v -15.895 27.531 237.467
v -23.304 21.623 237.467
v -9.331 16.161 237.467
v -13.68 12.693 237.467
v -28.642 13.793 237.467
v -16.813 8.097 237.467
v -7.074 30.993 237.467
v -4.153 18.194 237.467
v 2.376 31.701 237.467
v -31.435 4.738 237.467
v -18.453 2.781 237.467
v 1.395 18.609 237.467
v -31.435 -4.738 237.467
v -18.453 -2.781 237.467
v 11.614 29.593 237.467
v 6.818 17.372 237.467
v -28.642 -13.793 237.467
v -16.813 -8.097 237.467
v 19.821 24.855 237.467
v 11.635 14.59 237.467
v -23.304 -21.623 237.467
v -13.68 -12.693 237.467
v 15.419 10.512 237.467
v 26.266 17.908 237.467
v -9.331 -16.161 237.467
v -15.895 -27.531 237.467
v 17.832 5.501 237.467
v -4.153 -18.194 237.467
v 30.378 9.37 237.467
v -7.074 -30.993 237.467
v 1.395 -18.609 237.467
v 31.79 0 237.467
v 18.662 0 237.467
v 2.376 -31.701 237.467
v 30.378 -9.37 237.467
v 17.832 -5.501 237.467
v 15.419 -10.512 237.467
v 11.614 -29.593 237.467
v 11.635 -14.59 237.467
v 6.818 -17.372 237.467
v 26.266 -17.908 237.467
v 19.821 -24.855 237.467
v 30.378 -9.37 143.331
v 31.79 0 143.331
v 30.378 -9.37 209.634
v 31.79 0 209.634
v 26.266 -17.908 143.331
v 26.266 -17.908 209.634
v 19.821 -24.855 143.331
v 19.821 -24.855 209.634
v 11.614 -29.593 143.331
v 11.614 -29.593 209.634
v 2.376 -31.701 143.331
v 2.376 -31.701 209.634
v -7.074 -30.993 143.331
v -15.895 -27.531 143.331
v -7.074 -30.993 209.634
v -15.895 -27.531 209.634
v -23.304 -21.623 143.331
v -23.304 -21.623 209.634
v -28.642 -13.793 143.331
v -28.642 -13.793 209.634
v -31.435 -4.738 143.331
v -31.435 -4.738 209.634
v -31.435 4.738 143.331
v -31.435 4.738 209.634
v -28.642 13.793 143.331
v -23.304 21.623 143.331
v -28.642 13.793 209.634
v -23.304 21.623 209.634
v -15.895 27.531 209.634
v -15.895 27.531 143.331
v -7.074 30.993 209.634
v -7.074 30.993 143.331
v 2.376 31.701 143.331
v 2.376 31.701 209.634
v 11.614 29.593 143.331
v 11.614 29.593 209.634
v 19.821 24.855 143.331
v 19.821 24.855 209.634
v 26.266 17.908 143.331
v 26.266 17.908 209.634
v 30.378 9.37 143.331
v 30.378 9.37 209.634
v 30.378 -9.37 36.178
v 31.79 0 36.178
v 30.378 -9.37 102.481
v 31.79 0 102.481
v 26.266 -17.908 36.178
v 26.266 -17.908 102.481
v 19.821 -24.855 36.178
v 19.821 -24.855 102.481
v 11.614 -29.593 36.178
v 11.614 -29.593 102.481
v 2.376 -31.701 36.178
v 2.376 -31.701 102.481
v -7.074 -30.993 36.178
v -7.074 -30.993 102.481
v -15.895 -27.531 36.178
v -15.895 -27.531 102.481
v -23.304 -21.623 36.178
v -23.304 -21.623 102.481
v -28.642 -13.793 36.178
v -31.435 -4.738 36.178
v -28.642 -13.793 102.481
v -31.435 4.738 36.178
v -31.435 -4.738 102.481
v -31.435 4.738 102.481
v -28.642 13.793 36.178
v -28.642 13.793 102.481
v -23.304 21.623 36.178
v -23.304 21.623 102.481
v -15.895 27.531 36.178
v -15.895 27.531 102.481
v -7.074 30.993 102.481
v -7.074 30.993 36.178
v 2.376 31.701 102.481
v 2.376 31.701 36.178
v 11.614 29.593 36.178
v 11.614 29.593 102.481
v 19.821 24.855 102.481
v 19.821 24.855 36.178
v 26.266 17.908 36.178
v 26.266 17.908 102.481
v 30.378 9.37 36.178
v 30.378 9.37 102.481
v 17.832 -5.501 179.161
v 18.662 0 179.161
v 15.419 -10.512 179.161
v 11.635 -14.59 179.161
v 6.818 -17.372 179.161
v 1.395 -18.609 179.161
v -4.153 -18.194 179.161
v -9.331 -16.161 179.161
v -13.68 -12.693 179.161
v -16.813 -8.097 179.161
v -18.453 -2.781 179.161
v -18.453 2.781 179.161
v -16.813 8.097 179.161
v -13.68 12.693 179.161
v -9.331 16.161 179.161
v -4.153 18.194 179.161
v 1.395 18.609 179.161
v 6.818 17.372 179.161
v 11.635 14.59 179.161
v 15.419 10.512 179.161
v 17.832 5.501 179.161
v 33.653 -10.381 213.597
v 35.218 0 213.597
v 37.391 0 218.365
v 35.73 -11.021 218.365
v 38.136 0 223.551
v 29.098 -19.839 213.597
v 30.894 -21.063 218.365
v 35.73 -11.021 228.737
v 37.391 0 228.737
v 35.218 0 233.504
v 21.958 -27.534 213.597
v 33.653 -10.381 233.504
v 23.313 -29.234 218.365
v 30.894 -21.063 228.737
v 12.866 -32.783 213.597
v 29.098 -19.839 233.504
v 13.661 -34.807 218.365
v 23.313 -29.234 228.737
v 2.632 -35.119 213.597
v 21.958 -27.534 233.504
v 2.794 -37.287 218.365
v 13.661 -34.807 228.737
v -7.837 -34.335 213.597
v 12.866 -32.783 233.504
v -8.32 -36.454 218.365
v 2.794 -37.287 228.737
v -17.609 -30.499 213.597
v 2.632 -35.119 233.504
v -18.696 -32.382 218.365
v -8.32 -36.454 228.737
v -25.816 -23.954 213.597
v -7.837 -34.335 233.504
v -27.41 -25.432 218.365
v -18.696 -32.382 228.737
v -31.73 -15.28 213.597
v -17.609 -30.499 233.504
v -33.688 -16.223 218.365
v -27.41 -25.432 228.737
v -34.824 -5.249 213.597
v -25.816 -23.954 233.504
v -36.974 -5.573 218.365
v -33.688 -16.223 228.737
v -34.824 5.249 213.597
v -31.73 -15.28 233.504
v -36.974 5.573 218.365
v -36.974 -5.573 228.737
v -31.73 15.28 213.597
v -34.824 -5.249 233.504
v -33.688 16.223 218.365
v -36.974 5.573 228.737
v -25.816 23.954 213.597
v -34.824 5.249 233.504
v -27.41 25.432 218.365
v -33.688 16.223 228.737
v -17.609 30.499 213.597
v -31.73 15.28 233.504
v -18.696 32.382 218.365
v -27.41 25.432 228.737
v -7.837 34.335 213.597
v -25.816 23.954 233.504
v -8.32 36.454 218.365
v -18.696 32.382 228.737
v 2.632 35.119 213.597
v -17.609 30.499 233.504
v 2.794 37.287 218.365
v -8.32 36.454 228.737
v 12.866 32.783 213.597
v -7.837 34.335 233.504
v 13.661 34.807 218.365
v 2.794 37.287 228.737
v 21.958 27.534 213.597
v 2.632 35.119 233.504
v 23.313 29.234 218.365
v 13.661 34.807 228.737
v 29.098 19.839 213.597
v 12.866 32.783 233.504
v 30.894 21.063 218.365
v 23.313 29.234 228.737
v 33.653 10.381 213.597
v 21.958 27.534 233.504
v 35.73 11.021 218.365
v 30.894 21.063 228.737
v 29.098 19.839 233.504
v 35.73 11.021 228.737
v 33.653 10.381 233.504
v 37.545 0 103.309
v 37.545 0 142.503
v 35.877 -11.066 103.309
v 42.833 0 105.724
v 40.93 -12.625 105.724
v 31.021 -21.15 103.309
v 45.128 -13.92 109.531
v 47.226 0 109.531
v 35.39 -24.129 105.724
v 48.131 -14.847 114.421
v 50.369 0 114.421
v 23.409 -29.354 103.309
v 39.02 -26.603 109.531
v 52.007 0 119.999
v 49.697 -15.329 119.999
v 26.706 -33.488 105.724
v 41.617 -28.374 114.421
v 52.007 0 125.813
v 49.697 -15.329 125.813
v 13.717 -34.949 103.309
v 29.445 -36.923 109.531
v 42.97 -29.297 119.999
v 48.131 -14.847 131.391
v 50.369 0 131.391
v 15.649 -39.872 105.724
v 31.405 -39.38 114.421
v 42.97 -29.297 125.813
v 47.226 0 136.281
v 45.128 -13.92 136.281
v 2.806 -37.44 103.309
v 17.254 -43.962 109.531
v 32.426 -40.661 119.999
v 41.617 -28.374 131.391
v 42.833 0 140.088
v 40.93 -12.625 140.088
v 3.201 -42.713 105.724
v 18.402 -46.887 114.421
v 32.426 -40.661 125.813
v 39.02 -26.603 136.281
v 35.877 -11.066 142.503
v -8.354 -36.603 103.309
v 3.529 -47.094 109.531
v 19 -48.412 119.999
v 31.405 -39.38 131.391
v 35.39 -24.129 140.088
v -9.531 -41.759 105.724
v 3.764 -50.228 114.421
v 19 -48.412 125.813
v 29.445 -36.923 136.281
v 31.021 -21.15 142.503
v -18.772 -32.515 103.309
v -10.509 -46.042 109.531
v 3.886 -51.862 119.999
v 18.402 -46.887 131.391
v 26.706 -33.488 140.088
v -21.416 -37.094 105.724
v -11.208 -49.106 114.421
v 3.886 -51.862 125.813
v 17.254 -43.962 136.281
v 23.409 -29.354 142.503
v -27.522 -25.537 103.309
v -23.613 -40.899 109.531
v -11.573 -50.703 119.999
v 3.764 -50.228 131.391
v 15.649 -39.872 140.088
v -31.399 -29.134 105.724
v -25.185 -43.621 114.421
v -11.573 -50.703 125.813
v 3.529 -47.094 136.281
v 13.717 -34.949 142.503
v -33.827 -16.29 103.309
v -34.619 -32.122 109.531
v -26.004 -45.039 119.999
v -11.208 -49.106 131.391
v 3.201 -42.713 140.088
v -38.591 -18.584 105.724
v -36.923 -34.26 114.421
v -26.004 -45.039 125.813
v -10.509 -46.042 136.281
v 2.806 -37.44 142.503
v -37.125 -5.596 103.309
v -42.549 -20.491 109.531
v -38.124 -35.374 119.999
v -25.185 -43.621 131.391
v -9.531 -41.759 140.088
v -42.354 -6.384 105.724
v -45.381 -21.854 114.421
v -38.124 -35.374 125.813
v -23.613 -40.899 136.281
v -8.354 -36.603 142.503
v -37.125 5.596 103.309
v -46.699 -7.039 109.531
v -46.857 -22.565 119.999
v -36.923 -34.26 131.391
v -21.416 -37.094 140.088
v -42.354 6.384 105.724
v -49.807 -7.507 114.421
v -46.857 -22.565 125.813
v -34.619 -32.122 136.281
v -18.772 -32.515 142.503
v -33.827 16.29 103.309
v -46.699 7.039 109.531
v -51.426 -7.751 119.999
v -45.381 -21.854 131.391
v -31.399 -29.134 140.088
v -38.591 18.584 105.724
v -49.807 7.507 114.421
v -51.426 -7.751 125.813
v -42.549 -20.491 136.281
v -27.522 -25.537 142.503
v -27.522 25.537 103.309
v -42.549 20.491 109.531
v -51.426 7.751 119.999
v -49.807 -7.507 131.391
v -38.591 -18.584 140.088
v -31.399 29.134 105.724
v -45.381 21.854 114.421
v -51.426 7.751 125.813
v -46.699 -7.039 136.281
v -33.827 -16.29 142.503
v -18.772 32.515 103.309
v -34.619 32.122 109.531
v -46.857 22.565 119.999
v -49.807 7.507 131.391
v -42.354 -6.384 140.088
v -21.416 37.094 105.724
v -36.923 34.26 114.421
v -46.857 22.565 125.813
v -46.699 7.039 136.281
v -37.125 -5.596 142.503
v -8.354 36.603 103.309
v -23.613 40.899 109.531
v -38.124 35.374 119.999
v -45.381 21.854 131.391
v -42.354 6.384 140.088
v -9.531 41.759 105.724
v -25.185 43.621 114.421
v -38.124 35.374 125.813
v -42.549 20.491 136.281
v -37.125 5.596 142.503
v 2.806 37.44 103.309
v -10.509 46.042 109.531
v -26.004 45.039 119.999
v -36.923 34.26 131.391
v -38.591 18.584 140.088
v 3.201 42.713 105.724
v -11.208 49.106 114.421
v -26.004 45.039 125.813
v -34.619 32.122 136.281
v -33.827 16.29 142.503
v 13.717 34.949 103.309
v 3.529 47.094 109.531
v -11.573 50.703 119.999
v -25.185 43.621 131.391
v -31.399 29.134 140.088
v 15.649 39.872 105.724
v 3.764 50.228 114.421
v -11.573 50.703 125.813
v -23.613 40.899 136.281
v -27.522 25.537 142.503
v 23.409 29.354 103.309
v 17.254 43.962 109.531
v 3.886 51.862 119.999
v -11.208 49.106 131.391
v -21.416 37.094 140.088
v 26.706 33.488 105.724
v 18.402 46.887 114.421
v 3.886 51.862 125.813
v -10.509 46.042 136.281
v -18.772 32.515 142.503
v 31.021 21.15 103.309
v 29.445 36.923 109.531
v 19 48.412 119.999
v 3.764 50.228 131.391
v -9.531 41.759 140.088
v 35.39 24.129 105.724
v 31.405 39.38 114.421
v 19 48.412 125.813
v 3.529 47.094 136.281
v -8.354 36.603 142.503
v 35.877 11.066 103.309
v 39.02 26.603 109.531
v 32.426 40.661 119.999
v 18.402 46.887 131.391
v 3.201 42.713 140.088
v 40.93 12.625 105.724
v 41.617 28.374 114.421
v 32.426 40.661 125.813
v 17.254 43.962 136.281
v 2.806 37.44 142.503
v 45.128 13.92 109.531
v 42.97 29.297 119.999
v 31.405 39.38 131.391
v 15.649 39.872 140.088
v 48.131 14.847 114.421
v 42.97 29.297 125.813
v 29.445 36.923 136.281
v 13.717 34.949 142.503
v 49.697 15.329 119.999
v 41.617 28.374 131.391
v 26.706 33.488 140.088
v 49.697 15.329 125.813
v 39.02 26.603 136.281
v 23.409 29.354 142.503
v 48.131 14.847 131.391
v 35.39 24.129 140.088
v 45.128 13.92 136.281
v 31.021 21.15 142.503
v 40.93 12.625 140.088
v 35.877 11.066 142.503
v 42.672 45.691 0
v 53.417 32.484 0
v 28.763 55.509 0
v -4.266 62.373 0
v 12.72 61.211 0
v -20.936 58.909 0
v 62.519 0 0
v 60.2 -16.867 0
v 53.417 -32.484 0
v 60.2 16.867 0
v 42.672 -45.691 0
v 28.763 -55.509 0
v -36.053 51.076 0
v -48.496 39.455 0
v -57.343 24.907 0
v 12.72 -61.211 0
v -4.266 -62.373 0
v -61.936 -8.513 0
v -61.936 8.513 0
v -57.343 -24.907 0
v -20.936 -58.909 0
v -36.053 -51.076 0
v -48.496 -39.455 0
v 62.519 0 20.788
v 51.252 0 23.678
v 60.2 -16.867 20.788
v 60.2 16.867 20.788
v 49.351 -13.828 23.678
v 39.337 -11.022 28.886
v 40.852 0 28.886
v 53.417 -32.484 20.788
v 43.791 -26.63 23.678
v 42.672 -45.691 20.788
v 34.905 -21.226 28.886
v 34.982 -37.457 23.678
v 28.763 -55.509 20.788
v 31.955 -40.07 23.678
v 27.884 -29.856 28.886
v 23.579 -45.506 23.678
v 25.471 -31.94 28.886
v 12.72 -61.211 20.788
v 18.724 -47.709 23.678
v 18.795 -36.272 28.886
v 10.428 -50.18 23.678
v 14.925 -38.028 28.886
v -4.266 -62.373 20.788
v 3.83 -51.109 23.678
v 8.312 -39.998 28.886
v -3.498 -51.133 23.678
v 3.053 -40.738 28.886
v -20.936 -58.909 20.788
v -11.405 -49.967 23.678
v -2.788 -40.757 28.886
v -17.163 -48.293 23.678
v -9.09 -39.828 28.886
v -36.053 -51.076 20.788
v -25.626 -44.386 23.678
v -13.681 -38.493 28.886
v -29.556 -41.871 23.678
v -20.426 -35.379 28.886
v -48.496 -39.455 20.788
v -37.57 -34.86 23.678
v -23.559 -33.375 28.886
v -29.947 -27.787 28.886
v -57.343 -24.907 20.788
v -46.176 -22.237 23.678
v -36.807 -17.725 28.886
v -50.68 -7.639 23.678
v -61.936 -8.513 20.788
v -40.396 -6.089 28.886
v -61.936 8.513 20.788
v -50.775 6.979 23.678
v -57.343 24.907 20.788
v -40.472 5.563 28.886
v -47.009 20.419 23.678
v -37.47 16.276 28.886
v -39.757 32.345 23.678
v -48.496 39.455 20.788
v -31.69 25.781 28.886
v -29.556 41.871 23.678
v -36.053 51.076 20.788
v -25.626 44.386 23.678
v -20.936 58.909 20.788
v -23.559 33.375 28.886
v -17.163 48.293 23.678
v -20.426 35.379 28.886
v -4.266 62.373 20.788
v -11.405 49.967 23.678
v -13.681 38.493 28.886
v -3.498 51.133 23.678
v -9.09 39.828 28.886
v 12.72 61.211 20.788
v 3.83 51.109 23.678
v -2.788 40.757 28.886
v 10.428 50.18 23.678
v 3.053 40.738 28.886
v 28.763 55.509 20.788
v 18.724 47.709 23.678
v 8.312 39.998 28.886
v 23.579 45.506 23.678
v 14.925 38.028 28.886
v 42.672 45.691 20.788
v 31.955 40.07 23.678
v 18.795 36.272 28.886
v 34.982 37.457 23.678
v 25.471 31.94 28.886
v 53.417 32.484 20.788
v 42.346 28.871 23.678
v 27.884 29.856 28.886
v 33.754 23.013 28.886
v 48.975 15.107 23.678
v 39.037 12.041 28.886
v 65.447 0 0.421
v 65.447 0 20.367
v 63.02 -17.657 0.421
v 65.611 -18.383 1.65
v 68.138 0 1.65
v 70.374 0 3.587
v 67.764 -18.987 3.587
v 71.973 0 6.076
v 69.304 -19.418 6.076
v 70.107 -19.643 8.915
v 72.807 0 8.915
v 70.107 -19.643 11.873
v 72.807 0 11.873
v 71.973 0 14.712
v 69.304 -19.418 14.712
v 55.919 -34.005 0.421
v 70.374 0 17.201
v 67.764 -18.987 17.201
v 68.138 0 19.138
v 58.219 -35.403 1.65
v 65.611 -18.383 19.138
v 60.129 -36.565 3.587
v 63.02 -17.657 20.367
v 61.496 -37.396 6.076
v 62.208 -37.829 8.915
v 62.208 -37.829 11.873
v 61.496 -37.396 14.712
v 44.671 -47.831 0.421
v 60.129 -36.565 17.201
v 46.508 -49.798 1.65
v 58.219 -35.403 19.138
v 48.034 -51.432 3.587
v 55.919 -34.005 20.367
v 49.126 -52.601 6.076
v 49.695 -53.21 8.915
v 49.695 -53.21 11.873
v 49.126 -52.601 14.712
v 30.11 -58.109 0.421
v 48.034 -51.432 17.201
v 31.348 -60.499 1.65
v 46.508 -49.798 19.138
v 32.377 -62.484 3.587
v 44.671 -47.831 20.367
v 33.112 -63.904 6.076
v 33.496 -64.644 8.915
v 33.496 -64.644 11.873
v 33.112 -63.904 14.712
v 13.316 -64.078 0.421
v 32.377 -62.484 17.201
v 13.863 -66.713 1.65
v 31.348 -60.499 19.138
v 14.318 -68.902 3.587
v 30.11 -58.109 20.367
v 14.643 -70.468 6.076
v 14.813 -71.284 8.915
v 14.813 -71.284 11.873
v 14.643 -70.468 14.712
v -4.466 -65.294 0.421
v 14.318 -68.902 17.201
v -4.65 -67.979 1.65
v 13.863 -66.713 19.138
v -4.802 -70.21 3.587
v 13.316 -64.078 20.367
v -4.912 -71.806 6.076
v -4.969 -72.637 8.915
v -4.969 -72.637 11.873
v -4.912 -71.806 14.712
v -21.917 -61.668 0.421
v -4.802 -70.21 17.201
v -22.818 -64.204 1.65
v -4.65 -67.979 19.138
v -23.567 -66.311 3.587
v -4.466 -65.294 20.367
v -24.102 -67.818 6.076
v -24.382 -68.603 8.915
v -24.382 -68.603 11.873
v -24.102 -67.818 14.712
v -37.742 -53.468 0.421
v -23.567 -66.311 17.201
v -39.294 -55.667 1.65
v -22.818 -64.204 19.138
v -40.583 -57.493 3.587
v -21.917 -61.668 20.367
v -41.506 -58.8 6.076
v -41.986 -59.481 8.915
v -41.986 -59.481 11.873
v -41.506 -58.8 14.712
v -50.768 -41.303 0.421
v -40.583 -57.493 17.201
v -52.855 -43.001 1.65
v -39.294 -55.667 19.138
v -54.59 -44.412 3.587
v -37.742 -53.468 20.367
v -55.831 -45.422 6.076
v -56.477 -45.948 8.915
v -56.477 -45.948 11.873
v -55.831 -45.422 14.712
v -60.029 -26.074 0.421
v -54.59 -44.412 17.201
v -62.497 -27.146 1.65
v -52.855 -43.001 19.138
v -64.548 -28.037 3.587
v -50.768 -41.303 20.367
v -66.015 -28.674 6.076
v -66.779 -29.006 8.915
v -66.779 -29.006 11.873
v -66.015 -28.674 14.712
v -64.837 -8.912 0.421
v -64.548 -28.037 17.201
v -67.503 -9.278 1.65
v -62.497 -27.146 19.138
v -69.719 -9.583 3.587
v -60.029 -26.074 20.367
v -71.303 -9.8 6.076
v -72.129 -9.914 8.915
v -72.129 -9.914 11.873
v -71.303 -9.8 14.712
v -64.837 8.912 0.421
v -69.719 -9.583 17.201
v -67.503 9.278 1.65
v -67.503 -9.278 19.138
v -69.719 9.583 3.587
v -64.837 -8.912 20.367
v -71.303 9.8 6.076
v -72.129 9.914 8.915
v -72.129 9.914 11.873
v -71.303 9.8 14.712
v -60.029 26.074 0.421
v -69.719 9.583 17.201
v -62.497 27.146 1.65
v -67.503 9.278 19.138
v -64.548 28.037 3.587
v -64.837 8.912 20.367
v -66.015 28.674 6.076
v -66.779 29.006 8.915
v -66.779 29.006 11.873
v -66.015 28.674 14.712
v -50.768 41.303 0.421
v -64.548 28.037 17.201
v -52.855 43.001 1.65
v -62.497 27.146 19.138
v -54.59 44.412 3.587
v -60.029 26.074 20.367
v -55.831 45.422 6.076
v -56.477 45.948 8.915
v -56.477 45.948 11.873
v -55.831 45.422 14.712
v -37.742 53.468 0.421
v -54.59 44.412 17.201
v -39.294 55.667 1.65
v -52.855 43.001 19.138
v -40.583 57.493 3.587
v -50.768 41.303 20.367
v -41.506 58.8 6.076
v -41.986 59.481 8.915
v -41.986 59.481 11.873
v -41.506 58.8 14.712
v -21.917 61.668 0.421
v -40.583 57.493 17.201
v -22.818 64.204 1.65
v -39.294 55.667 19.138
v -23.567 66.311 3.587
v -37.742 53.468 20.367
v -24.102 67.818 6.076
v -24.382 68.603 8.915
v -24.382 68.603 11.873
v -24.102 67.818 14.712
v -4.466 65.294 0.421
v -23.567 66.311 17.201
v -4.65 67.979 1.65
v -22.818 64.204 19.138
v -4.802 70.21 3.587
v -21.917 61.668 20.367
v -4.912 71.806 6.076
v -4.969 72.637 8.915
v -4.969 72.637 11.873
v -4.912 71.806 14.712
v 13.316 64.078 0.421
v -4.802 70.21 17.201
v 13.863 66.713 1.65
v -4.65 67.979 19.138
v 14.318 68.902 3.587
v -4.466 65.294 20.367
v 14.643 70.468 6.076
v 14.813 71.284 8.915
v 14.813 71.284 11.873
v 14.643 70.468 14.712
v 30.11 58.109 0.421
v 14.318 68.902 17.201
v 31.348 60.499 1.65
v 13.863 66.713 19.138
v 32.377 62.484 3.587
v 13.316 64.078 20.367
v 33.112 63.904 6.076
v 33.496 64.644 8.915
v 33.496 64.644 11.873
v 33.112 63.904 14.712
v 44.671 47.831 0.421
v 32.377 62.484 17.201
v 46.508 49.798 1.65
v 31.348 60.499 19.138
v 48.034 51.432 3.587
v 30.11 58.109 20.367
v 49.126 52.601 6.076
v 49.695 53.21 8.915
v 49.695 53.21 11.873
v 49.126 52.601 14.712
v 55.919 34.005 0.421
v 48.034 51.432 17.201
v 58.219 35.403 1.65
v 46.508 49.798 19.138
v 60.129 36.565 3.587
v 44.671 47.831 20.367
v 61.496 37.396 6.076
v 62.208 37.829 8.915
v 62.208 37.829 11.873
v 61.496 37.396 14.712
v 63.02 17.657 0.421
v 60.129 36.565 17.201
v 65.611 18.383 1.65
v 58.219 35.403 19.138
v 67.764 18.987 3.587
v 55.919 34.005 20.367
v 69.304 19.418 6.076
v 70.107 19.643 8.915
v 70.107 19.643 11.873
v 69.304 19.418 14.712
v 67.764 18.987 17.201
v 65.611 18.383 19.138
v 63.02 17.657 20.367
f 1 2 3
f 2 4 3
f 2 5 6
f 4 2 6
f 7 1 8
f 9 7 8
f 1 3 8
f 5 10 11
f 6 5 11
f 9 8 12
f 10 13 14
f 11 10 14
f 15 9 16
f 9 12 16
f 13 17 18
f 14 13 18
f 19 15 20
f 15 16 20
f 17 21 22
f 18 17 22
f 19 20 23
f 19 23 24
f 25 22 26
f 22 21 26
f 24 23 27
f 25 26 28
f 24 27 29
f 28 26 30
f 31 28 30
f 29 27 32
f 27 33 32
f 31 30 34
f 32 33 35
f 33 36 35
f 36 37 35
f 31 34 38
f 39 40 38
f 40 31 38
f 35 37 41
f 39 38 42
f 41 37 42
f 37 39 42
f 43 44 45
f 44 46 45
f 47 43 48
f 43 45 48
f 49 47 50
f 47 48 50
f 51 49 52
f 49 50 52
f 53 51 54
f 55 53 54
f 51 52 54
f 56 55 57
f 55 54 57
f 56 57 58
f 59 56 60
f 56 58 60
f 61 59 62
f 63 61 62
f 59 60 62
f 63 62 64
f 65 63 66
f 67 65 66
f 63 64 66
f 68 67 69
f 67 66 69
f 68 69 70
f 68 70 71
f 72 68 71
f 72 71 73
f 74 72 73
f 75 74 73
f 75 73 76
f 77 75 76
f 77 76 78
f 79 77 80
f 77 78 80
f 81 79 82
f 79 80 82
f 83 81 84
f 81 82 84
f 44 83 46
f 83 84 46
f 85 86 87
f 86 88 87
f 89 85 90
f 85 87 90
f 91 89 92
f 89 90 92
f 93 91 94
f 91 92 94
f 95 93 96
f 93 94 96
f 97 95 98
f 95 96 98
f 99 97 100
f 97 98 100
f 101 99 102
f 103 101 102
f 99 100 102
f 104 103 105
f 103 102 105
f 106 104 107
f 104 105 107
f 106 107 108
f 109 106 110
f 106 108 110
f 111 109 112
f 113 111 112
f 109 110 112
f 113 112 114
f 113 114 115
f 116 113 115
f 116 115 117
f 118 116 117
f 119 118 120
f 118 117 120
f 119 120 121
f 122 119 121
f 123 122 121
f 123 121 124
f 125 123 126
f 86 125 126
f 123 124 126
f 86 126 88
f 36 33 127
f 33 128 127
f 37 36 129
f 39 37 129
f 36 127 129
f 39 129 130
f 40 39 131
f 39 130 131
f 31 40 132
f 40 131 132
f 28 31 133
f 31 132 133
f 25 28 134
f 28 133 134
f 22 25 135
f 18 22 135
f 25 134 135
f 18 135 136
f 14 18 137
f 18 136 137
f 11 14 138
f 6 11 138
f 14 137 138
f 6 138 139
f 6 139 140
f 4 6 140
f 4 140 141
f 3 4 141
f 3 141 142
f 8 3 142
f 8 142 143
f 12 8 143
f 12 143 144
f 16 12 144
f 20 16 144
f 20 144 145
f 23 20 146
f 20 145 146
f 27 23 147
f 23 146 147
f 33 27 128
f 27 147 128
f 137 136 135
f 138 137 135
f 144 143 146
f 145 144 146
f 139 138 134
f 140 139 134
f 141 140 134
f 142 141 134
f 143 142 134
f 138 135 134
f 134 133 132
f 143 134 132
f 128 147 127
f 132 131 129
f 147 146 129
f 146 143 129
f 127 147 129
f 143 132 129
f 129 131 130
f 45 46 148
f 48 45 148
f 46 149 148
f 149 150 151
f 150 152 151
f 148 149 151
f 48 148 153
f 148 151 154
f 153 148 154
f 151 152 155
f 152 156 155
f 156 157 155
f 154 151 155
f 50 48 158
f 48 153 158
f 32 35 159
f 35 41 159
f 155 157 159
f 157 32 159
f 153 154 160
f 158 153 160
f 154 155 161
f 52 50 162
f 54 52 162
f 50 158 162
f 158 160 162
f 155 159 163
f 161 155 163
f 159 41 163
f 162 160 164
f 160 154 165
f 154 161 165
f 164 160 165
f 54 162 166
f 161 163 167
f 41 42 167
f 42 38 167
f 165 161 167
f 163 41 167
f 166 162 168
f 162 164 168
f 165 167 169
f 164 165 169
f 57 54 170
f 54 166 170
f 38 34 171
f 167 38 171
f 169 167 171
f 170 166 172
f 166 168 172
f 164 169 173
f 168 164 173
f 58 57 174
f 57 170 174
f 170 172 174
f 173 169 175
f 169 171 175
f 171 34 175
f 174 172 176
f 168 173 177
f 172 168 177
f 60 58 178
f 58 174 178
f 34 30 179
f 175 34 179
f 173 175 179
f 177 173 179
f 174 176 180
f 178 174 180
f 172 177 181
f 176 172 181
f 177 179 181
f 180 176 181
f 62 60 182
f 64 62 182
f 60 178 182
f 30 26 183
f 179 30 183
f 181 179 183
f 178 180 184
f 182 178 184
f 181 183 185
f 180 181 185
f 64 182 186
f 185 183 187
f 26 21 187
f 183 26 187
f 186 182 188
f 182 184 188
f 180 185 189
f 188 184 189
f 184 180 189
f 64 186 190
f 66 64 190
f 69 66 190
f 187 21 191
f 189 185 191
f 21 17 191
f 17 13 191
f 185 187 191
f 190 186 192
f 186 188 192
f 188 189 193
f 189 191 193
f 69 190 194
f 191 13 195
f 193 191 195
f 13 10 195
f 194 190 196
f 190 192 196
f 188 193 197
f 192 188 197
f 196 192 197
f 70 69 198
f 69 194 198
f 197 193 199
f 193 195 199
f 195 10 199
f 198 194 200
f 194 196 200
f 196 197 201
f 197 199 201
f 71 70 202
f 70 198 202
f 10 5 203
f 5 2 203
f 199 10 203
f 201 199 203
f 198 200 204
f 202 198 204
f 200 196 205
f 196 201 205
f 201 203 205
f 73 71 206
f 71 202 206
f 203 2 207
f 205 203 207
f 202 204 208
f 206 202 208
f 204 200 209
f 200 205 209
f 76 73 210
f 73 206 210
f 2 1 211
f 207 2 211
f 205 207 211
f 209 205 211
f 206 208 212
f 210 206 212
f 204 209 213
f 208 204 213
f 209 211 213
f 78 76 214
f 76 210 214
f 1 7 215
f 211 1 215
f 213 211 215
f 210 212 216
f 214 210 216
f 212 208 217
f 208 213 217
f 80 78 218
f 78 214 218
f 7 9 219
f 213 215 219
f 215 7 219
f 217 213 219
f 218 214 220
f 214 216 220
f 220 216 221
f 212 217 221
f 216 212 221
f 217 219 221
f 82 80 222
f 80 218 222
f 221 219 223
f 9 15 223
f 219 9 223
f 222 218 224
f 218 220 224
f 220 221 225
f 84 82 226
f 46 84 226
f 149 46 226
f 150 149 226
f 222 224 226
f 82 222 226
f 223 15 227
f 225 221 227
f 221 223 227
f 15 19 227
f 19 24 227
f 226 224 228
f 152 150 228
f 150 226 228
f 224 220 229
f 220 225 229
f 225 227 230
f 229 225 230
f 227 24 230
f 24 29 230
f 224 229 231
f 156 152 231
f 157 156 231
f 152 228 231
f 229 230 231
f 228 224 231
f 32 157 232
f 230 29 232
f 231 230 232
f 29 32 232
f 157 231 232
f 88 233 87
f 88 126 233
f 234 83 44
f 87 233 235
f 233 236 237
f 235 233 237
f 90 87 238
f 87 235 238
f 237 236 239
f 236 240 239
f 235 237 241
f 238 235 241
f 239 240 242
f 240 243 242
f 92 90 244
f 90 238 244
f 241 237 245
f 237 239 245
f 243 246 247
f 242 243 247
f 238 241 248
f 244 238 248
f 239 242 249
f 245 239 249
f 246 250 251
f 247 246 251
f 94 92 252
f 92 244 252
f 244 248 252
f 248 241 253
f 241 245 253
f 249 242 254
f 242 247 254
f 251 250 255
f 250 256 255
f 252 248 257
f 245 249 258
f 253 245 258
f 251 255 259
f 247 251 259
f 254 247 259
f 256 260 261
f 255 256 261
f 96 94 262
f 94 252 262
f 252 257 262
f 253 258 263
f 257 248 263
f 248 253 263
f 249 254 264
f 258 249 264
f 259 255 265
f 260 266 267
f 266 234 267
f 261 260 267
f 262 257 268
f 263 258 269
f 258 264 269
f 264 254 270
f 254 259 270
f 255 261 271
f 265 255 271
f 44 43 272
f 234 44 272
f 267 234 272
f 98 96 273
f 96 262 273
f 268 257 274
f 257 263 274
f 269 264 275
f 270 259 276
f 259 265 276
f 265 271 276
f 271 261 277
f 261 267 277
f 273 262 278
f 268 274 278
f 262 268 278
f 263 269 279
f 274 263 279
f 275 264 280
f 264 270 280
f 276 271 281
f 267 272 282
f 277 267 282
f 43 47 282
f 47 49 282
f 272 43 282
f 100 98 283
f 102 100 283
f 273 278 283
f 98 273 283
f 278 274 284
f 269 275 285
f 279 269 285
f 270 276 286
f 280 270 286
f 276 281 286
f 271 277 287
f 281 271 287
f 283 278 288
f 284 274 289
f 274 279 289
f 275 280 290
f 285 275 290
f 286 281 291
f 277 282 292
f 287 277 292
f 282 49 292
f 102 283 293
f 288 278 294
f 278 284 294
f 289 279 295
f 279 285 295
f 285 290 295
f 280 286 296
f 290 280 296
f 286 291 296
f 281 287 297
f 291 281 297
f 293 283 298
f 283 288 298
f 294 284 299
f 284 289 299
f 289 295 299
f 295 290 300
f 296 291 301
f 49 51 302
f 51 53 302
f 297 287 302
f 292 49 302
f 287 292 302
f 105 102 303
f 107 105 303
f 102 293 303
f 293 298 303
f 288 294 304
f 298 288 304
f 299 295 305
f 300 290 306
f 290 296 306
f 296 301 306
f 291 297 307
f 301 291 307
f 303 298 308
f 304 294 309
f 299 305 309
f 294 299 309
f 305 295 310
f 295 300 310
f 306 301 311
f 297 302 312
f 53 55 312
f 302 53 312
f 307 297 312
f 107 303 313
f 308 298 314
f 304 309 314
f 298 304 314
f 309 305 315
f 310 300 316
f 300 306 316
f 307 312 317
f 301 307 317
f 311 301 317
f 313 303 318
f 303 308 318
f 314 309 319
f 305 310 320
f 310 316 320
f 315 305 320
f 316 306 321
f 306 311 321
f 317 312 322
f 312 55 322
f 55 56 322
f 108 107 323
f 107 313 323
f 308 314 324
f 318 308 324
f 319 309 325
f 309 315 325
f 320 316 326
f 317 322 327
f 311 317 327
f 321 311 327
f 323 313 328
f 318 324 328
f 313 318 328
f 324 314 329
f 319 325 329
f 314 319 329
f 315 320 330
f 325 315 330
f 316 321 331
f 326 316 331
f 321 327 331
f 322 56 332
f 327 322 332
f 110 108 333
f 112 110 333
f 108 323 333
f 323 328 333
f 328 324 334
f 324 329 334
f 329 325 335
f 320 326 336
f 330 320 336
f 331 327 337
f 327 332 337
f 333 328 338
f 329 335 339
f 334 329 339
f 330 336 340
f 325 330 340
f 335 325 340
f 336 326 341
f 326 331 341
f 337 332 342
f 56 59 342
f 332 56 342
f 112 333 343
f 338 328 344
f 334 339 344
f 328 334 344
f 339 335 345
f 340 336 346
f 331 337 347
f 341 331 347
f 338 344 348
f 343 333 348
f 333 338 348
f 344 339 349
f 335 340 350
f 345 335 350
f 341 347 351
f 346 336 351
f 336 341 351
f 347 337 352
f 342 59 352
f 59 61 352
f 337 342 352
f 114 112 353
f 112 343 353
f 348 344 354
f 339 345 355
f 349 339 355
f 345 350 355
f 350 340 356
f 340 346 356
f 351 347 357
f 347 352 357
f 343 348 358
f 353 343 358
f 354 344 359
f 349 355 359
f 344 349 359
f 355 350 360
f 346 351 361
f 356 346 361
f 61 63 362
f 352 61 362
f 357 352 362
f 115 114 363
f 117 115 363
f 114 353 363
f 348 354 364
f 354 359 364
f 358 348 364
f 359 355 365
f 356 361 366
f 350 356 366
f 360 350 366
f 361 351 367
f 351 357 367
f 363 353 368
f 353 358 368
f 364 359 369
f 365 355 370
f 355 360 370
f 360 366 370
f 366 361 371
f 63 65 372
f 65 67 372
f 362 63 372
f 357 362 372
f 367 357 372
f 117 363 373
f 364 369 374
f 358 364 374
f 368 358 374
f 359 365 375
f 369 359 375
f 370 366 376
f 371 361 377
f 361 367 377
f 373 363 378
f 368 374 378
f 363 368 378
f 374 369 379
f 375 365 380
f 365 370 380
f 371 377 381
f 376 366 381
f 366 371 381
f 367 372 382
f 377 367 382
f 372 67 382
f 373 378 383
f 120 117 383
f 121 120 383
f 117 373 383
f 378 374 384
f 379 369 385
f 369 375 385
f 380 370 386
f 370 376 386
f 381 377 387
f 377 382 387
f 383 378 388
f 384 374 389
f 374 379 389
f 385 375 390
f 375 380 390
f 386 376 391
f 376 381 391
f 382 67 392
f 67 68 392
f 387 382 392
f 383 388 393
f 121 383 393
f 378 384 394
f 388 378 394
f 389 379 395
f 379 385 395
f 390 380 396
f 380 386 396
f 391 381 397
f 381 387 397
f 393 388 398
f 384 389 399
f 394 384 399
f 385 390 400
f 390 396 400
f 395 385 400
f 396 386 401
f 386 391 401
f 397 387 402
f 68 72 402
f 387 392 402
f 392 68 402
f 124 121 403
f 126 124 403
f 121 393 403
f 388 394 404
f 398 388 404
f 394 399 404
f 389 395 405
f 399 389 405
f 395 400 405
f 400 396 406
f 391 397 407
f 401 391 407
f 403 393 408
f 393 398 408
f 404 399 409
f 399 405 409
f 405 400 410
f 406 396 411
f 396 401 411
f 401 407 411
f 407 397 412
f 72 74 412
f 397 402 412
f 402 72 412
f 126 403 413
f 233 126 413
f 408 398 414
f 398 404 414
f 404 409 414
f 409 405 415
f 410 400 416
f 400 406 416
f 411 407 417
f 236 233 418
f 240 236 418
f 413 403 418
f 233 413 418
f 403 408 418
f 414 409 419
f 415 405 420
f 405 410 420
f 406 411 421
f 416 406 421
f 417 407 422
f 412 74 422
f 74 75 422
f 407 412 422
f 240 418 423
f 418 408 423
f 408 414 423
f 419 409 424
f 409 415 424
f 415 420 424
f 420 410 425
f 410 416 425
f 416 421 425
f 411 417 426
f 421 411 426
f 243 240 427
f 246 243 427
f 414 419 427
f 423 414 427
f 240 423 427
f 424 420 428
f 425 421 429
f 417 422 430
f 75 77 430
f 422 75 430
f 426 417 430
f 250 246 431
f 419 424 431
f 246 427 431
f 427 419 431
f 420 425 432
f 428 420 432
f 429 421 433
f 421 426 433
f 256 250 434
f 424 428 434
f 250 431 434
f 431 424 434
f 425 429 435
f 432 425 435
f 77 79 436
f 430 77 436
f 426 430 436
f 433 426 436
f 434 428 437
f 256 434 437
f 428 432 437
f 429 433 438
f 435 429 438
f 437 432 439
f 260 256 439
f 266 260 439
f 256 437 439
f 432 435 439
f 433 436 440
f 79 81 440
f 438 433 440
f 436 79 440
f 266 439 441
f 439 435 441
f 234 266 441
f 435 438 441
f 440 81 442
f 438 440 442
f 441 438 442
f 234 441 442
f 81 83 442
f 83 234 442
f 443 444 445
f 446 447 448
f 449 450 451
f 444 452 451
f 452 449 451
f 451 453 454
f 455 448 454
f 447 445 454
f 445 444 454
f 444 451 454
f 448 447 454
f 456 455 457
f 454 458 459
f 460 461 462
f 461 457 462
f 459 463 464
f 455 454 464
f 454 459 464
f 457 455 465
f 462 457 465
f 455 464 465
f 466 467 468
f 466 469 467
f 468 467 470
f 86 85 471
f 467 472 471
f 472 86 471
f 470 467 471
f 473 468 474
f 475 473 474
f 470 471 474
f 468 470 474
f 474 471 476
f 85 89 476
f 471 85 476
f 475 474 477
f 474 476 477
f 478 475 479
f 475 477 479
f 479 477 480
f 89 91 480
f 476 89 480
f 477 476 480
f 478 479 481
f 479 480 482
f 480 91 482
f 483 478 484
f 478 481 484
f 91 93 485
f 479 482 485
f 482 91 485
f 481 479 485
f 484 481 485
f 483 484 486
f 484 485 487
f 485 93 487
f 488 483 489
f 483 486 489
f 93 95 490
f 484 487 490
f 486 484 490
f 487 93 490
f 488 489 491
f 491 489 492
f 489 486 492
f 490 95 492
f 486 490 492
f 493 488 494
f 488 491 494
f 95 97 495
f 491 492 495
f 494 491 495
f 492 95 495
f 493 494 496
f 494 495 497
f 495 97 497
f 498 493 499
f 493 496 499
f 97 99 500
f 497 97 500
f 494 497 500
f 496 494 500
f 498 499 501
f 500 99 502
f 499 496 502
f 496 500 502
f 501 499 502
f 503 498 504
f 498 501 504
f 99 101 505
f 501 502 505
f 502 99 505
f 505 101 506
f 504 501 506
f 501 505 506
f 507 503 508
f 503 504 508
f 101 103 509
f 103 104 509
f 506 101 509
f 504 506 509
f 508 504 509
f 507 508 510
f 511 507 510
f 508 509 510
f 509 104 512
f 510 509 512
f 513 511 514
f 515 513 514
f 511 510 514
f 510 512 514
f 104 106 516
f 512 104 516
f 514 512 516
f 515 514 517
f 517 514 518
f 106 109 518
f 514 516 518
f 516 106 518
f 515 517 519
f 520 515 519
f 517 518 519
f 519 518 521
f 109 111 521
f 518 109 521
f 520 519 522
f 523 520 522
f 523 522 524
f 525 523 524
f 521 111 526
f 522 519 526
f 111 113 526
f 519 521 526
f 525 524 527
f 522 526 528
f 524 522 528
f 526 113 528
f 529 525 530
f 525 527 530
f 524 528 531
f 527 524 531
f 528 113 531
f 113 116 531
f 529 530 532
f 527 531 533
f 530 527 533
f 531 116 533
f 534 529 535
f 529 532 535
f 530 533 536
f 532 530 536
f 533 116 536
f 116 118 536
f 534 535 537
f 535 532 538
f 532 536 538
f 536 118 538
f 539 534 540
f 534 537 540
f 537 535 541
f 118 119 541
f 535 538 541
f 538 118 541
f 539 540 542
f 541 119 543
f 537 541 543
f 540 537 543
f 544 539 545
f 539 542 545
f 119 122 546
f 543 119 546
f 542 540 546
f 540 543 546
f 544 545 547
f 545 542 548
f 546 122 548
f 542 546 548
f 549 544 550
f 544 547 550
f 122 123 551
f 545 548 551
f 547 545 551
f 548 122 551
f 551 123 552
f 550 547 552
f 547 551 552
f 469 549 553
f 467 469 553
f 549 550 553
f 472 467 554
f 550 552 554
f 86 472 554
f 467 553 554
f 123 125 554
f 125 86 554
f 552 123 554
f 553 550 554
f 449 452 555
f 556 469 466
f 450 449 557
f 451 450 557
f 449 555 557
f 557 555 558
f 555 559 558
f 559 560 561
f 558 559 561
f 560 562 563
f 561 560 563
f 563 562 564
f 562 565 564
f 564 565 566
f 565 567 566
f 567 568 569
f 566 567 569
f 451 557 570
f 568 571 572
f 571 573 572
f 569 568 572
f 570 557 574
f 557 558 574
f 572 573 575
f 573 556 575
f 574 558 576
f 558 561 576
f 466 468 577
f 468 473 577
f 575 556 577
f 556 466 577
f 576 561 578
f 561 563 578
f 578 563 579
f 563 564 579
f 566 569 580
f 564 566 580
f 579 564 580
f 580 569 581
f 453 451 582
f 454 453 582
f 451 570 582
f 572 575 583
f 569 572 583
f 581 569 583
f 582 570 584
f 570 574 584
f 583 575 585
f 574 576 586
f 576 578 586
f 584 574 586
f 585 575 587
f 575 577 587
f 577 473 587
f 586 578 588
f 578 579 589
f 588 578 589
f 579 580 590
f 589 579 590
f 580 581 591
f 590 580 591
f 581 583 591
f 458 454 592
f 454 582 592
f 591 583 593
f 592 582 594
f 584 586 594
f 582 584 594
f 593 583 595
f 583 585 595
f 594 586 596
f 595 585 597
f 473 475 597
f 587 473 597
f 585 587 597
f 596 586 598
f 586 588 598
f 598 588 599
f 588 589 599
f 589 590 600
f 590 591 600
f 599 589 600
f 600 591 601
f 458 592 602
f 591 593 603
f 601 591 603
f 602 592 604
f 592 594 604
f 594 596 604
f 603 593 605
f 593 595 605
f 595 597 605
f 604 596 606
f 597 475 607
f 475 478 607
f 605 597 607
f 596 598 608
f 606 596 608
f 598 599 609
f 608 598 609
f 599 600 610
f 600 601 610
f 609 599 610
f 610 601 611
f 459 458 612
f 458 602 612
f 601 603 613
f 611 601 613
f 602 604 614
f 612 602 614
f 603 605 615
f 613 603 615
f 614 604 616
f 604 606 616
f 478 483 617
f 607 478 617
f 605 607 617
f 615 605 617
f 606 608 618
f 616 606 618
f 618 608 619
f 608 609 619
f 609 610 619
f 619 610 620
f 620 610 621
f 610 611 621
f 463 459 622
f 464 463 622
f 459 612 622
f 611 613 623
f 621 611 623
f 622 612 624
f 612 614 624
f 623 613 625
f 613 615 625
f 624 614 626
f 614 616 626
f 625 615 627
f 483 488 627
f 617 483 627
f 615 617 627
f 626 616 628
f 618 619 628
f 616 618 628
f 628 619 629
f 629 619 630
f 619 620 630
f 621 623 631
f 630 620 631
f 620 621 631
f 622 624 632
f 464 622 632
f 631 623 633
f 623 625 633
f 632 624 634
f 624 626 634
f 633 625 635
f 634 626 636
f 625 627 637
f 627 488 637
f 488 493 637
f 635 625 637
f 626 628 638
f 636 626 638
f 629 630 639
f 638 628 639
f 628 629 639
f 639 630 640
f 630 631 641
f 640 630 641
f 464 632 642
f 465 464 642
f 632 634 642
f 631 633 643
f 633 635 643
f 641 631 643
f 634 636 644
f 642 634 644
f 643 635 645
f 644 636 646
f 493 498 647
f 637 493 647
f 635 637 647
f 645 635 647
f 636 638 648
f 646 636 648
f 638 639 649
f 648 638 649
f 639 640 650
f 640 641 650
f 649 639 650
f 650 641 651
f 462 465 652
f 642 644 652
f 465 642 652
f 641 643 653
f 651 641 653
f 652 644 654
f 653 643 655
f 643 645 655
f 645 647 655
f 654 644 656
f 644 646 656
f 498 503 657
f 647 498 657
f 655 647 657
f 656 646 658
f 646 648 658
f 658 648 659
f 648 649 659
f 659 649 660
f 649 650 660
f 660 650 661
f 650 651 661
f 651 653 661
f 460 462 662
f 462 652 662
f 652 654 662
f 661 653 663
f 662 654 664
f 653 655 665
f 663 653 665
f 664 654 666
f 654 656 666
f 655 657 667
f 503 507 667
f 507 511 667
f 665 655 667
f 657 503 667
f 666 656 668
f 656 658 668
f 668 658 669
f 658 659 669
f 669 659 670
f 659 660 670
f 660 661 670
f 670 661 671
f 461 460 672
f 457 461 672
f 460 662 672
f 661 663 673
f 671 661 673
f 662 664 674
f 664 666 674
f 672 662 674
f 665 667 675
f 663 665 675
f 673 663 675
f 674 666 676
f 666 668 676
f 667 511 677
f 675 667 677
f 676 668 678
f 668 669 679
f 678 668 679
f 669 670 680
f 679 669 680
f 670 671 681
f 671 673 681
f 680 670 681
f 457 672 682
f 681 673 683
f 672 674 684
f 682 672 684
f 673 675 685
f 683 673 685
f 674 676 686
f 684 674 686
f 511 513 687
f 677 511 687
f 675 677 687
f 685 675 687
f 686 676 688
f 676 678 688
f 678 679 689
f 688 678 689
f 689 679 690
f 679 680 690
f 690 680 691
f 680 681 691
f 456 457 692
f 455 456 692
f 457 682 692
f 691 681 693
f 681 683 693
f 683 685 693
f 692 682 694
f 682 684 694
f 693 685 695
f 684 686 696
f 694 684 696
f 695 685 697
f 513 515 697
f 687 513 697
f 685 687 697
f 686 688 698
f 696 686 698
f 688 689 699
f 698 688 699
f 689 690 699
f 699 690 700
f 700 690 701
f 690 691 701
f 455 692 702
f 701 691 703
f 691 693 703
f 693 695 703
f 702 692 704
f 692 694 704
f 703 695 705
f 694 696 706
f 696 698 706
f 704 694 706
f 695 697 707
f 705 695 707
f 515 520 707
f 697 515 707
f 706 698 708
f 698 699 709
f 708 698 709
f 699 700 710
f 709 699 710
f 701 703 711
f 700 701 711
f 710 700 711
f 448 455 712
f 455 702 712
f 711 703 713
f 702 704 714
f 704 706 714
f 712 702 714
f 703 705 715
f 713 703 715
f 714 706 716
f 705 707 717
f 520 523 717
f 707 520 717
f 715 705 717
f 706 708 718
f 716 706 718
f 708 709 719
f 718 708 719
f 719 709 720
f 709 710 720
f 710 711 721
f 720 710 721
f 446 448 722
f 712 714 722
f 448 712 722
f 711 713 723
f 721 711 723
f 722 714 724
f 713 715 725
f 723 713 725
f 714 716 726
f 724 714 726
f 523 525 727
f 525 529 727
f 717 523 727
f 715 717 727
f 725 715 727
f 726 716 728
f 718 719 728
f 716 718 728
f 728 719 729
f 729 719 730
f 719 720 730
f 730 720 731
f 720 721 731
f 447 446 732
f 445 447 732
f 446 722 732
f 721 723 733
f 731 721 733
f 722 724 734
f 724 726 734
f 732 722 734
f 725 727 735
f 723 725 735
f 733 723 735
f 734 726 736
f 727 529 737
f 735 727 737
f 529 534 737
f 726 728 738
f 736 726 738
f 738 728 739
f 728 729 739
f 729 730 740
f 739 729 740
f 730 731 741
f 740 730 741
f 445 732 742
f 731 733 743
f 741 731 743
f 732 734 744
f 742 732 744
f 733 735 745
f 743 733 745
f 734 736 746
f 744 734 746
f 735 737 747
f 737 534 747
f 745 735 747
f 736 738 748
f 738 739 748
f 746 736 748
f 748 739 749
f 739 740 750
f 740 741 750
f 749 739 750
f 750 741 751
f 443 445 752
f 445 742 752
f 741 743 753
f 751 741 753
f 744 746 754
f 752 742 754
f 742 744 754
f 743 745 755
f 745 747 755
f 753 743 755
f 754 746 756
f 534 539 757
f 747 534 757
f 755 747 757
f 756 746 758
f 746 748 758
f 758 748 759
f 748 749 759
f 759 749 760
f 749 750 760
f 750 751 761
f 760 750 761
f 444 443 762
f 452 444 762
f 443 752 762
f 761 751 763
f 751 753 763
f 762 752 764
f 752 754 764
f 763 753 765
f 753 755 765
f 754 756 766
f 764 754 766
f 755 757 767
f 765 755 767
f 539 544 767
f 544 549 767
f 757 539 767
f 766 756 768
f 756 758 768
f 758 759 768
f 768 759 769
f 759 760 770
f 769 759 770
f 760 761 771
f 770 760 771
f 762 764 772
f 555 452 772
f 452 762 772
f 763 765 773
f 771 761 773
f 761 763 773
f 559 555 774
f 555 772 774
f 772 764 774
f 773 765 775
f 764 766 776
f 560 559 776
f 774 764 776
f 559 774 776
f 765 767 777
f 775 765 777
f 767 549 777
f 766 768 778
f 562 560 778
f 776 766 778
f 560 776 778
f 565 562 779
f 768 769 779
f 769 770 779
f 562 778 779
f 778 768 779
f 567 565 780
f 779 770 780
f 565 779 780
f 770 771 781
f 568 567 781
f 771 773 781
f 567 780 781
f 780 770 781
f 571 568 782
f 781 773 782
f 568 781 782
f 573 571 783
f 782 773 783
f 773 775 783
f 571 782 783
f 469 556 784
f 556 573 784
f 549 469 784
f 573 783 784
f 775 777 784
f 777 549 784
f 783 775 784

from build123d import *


with BuildPart() as f1:
    # F0 (on Front) → F1 (revolve)
    with BuildSketch(Plane.XZ):
        with BuildLine():
            Line((0, 179.160506), (0, 0))
            Line((0, 0), (62.518604, 0))
            ThreePointArc((62.518604, 0), (72.91275, 10.394146), (62.518604, 20.788292))
            ThreePointArc((62.518604, 20.788292), (45.913128, 26.004496), (31.790324, 36.177844))
            Line((31.790324, 36.177844), (31.790324, 102.48149))
            ThreePointArc((31.790324, 102.48149), (52.214991, 122.906158), (31.790324, 143.330825))
            Line((31.790324, 143.330825), (31.790324, 209.634472))
            ThreePointArc((31.790324, 209.634472), (38.135859, 223.550893), (31.790324, 237.467315))
            Line((31.790324, 237.467315), (18.661554, 237.467315))
            Line((18.661554, 237.467315), (18.661554, 179.160506))
            Line((18.661554, 179.160506), (0, 179.160506))
        make_face()
    revolve(axis=Axis((0, 0, 89.580253), (0, 0, -1)))


solid = f1.part
